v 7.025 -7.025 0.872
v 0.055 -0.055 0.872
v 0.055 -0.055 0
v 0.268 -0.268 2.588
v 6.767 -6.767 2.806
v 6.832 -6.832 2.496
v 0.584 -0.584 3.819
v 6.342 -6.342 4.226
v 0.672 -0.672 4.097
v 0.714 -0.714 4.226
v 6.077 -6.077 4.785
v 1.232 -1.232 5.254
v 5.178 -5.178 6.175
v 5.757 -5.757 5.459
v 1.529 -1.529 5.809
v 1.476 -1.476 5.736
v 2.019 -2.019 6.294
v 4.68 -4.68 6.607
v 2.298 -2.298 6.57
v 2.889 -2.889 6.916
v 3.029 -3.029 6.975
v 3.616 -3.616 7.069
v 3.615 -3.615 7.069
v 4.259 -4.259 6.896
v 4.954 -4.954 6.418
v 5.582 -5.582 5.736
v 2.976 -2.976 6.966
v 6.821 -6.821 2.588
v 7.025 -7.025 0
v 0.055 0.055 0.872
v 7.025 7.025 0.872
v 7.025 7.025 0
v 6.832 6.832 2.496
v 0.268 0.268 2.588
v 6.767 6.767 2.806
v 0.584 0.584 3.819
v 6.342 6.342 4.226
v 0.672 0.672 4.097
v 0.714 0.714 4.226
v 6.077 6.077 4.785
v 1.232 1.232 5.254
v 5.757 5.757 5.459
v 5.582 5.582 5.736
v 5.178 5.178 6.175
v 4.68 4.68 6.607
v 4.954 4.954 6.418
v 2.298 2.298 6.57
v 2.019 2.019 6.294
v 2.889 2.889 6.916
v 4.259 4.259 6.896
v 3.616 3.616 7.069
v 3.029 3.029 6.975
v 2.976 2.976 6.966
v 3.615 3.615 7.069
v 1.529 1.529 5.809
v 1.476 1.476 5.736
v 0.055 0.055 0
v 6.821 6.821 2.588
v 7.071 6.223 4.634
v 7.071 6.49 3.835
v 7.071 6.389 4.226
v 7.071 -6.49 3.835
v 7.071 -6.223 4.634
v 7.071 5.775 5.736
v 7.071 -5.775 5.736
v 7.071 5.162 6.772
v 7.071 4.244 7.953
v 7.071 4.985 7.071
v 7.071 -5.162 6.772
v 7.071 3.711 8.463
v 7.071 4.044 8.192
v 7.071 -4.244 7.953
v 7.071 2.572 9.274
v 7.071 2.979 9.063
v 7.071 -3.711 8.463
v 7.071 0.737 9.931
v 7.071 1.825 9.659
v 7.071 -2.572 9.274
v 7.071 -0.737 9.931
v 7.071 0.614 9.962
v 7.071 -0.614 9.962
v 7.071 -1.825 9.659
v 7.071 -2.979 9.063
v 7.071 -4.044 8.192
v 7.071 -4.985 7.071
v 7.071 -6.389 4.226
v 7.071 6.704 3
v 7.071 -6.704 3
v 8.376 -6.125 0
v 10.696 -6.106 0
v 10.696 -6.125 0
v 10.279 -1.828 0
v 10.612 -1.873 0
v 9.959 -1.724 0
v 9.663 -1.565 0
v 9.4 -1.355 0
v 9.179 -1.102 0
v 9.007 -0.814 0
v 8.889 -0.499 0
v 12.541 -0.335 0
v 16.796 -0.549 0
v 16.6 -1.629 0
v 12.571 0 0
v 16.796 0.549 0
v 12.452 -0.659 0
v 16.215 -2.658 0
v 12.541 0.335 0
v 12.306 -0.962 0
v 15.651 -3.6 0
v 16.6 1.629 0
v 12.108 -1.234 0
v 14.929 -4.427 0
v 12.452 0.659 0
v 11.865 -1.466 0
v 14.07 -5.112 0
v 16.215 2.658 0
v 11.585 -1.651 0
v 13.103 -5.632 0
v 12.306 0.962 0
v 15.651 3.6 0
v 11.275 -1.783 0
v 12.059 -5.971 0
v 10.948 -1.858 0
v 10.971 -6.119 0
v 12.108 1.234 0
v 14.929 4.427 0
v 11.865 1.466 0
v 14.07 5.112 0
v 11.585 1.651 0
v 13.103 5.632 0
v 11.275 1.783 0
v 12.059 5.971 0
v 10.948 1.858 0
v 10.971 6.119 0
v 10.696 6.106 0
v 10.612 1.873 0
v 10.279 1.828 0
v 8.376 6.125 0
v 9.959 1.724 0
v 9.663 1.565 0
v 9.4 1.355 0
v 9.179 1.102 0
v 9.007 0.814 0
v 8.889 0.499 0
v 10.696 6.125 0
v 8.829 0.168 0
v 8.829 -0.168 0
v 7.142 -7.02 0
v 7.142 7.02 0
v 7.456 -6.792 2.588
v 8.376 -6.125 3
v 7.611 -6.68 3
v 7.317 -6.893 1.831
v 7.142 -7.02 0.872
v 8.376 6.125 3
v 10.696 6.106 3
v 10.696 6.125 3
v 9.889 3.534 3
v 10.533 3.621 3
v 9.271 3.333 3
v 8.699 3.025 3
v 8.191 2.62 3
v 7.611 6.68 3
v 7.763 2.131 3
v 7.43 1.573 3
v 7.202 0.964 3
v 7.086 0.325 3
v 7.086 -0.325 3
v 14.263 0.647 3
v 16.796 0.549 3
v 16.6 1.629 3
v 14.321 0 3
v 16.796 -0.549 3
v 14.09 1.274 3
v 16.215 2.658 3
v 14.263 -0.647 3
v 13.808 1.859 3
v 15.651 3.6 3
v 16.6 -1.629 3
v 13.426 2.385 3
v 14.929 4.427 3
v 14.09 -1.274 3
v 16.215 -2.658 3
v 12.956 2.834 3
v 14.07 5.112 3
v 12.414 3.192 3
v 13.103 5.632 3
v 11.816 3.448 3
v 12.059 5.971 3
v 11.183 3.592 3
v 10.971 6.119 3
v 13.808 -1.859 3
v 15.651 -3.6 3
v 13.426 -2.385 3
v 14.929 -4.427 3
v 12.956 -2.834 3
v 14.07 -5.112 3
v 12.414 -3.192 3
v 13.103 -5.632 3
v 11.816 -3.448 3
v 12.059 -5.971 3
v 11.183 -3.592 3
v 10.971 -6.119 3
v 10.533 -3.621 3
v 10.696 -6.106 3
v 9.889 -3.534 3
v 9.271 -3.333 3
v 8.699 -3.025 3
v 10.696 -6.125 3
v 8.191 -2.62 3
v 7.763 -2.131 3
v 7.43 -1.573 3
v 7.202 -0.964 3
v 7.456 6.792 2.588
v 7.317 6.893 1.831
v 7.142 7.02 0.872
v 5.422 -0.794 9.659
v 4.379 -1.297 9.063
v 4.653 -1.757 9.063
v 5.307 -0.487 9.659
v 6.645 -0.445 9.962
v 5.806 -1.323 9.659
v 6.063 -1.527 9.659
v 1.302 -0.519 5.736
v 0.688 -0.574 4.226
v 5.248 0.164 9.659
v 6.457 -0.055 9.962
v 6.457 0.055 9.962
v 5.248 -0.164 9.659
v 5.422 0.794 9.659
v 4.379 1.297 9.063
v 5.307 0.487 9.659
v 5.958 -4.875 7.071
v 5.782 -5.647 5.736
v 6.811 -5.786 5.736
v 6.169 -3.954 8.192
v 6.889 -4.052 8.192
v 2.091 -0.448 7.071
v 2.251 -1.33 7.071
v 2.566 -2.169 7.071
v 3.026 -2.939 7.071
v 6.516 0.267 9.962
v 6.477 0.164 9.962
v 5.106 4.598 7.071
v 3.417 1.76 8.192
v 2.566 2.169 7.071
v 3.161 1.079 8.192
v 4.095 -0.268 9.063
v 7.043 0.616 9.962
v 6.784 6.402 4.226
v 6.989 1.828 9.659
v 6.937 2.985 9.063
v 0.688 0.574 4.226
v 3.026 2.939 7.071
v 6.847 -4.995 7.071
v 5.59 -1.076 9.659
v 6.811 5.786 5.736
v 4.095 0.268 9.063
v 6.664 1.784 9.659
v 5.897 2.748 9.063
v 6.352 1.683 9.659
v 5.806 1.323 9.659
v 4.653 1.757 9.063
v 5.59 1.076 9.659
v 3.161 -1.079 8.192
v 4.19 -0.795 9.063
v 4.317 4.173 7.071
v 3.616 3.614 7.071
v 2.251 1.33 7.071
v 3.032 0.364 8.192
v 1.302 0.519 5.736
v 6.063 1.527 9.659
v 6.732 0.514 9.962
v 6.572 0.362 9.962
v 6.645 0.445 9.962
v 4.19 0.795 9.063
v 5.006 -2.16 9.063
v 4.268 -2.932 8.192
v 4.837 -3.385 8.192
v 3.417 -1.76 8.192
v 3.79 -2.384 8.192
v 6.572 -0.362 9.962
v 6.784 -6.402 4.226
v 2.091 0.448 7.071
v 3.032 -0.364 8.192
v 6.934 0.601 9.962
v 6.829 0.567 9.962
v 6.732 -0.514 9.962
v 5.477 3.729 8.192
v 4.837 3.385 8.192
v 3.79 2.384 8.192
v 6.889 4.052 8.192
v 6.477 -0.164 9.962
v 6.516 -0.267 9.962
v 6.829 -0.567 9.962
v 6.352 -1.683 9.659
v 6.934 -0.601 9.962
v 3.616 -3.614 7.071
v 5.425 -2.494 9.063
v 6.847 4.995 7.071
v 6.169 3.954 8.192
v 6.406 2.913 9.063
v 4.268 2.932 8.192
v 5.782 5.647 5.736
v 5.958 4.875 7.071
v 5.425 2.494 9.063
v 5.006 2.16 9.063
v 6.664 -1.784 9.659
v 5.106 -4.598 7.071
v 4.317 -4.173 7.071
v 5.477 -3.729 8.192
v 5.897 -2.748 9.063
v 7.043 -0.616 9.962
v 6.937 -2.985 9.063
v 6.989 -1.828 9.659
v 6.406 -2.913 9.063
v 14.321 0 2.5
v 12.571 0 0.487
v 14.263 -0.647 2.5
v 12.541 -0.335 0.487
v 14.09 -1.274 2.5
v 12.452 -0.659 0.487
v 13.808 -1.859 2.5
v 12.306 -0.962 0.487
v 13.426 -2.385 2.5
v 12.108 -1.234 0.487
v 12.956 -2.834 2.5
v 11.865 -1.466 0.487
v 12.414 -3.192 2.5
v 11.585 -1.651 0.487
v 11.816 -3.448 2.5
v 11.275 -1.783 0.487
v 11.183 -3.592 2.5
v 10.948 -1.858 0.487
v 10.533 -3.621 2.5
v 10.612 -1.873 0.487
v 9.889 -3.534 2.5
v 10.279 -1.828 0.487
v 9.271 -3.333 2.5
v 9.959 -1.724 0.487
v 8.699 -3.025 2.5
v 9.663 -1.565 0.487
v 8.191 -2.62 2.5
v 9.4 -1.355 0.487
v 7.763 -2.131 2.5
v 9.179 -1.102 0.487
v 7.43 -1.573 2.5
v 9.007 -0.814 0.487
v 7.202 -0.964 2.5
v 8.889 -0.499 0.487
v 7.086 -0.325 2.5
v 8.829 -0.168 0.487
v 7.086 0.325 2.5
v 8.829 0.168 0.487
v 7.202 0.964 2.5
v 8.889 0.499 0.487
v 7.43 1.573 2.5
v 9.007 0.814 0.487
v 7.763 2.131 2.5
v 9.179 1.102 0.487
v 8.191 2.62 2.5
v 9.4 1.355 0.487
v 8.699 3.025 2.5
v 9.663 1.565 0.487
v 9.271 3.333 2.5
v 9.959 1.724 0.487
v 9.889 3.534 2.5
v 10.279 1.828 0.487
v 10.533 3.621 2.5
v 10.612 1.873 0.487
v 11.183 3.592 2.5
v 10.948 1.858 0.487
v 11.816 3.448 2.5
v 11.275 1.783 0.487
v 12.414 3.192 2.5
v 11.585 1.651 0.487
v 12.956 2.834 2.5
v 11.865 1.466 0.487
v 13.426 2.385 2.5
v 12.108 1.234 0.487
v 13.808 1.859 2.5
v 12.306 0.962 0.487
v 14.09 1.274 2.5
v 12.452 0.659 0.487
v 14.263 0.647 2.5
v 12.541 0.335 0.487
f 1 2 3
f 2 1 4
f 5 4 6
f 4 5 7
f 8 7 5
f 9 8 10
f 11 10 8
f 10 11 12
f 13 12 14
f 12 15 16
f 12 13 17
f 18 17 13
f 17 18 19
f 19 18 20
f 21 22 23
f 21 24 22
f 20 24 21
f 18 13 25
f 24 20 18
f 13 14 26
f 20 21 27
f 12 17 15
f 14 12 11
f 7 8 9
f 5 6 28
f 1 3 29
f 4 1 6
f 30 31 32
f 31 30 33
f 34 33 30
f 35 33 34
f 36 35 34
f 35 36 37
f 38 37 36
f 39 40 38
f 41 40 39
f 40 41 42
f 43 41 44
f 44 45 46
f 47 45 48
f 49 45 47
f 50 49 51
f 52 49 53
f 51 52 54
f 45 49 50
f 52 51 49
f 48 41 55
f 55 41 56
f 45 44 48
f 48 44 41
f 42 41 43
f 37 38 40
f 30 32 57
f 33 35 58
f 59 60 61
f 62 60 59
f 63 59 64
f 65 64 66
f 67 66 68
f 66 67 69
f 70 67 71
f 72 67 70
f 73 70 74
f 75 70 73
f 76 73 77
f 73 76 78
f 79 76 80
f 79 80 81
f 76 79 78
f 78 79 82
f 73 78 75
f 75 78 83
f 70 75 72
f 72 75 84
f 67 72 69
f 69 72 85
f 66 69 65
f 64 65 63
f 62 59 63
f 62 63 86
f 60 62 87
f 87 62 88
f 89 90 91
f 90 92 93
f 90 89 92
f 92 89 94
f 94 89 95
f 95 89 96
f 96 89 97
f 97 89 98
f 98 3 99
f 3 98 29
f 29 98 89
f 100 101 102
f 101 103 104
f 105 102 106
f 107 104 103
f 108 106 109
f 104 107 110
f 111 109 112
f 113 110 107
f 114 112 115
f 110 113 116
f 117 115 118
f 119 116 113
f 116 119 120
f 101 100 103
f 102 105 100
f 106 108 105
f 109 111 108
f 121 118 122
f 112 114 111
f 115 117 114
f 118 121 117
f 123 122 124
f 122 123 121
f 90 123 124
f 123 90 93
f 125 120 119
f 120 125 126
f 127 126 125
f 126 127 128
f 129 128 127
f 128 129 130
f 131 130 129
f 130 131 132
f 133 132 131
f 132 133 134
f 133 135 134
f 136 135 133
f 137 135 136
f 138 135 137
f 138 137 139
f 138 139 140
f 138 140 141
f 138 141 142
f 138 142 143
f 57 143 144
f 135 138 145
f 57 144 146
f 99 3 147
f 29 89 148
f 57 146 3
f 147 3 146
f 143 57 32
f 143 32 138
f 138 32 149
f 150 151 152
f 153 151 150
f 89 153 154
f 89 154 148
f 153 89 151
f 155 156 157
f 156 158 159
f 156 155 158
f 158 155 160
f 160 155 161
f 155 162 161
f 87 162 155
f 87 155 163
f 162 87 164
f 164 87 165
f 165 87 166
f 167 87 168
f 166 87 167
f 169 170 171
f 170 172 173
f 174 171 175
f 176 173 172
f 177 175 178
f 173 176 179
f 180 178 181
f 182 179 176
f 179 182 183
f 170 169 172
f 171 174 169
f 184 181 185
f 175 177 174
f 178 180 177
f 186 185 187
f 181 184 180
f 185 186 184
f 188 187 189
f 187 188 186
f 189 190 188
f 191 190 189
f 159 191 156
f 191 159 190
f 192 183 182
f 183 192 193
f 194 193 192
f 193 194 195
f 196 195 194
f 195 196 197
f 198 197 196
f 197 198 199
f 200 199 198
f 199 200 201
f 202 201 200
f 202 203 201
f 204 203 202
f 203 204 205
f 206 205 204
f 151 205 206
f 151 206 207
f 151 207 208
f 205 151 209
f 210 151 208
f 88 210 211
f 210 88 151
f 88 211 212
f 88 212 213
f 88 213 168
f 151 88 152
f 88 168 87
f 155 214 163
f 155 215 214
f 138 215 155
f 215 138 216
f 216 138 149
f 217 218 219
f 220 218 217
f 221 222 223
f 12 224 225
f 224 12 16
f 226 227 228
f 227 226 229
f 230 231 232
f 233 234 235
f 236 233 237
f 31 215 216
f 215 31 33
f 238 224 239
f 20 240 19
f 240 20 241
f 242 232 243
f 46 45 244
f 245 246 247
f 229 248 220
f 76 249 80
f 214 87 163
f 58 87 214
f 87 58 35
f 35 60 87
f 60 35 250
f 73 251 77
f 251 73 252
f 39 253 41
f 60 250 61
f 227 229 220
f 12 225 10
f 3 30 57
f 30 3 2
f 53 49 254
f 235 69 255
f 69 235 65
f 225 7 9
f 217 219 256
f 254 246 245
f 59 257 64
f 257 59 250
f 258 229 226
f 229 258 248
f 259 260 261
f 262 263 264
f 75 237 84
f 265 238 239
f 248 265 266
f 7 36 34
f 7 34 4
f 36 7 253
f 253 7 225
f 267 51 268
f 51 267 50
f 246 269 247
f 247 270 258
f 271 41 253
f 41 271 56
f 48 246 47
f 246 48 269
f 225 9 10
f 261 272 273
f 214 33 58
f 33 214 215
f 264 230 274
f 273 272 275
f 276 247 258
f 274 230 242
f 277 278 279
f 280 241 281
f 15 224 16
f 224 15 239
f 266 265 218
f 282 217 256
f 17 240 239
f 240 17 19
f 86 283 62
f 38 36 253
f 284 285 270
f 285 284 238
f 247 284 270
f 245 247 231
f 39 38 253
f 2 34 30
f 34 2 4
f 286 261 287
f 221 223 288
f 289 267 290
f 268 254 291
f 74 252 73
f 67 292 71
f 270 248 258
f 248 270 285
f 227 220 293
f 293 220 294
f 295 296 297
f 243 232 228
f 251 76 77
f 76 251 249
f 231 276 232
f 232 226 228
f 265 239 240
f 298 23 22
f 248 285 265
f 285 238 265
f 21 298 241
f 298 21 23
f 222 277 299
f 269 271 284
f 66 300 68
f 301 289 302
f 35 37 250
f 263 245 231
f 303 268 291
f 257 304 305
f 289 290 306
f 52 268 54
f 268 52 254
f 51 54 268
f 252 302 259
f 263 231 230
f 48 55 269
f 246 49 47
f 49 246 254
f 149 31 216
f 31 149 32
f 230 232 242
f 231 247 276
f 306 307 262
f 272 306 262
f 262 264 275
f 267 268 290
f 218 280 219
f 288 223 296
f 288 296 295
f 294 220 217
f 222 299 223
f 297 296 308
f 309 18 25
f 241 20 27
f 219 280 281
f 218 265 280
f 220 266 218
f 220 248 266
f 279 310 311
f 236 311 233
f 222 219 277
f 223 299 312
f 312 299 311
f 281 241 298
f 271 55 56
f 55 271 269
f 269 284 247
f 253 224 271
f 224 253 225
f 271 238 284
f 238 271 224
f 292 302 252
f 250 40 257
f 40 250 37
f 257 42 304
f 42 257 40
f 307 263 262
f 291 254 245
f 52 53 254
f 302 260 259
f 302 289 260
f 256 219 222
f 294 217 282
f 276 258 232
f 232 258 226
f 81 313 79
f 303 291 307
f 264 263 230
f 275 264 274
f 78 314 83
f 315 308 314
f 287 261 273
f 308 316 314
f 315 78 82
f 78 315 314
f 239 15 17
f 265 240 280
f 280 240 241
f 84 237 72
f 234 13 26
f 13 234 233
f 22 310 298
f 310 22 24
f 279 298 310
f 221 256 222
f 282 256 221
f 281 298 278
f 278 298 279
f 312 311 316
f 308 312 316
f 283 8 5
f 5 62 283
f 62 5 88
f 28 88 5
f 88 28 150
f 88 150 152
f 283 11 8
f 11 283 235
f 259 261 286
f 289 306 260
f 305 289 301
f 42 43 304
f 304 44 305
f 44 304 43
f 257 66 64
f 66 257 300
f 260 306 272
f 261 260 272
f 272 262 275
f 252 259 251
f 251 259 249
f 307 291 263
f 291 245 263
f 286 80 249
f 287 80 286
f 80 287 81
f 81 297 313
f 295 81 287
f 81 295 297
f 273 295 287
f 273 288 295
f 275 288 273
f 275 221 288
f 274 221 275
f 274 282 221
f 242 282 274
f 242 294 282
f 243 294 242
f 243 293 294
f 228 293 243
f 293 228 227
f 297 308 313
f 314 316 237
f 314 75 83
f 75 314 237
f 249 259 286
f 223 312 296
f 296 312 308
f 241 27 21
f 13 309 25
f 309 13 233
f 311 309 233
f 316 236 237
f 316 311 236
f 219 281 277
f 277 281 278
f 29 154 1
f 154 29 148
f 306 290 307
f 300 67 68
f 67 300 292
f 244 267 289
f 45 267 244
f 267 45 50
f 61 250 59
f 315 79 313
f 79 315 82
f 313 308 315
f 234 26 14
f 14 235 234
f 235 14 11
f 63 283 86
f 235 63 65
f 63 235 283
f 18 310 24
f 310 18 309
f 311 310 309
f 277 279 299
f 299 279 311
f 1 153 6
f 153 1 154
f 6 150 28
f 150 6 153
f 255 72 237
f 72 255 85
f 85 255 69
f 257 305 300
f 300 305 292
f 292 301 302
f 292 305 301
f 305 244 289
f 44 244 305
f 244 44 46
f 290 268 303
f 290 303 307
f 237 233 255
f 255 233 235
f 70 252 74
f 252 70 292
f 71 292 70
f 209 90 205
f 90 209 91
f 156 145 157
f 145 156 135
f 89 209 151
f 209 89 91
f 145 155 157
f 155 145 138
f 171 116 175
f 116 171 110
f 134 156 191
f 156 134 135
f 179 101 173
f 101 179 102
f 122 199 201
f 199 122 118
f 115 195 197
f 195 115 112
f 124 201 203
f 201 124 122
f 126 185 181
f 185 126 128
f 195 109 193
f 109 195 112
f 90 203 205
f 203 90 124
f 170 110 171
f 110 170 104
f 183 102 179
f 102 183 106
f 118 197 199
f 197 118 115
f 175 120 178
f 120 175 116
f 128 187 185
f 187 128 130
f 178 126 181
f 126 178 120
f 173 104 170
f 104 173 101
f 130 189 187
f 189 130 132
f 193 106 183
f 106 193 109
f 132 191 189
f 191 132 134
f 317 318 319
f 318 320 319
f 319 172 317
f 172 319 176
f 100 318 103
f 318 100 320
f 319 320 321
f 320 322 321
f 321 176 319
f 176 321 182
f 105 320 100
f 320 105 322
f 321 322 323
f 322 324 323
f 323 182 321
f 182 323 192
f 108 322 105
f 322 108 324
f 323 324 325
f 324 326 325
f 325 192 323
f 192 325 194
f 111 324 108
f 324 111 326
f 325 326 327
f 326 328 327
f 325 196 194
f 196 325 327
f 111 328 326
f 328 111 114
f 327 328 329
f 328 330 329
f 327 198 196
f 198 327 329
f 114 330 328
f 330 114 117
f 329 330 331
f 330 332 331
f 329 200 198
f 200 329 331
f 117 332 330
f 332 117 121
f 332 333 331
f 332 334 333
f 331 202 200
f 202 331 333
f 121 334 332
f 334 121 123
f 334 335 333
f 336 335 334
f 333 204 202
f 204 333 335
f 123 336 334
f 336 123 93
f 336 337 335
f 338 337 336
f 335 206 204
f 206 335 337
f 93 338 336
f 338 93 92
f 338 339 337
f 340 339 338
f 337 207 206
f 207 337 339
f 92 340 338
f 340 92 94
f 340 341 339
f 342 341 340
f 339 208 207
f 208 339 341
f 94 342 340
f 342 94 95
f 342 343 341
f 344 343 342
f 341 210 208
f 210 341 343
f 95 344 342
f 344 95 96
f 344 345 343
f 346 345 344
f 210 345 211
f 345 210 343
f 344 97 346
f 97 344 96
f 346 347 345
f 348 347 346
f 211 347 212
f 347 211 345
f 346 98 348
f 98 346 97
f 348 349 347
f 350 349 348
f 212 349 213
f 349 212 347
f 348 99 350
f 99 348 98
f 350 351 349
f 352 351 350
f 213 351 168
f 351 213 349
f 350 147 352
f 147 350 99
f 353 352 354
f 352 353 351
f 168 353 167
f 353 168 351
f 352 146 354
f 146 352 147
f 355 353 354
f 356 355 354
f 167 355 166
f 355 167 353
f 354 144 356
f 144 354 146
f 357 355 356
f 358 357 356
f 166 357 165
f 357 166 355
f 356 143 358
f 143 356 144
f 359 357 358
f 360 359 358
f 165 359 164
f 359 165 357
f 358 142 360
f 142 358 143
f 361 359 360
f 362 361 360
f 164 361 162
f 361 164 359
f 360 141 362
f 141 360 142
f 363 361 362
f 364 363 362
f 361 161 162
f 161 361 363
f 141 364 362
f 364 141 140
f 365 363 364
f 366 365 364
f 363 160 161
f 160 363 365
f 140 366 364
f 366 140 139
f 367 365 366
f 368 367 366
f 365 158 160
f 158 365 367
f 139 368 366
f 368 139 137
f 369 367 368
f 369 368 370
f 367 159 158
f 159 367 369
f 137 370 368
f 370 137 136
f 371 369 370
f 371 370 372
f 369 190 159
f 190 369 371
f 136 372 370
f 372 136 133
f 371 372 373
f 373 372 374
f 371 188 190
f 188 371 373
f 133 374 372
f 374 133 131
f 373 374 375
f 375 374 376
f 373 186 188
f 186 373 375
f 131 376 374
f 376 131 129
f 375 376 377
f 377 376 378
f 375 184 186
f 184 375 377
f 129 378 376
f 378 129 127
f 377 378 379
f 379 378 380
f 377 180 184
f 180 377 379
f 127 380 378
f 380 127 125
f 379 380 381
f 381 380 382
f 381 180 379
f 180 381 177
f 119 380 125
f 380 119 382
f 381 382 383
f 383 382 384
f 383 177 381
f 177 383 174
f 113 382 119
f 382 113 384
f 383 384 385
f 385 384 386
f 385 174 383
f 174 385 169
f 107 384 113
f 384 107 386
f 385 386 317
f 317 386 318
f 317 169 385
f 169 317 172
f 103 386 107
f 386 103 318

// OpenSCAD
/*
 * Lid Postion Guide (Parametric), v0.42
 *
 * by Alex Franke (CodeCreations), Dec 2012
 * http://www.theFrankes.com
 * 
 * Licenced under Creative Commons Attribution - Non-Commercial - Share Alike 3.0 
 * 
 * DESCRIPTION: Serves as a guide for placing a rectangular lid onto a flat surface in 
 *   a specific position. 
 * 
 * INSTRUCTIONS:  Print 3-4 guides and install then with the lid in place, if possible. 
 * 
 * v0.42, Dec 28, 2012: Initial Release.
 * 
 * TODO: 
 *   * None at this time.
 */


/////////////////////////////////////////////////////////////////////////////
// User-defined values... 
/////////////////////////////////////////////////////////////////////////////

cornerAngle    = 90;   // Angle of corner the guild will be placed against
sideLength     = 10;   // The length of each side of the guide, extending from the corner
guideHeight    = 10;   // The height of the guide portion of the piece
bodyHeight     = 3;    // The height of the body portion that gets fastened down

shaftDiameter  = 3.75; // The diameter of the through-hole for the screw. #6=3.58
headDiameter   = 7.25; // The diameter of the head of the screw. #6=7.14
holePadding    = 2.5;  // The width of the material around the hole 
screwAngle     = 82;   // Countersink angle (angle of screw head -- 82 is pretty standard for wood 
                       //   screws.) Other common countersink angles are 60, 90, 100, 110, and 120. 

counterSink    = 0.5;  // Additional distance to inset the countersink

$fn            = 35;   // General curve quality


/////////////////////////////////////////////////////////////////////////////
// The code...
/////////////////////////////////////////////////////////////////////////////

wedgeLength = sideLength*cos(cornerAngle/2);
wedgeHeight = sideLength*sin(cornerAngle/2);
yHeight = (headDiameter/2-shaftDiameter/2)/tan(screwAngle/2); 

difference() {
	union() {
		intersection() {
	
			union() {
				wedge(wedgeLength, guideHeight, cornerAngle);
					linear_extrude(height=bodyHeight, convexity=4) {
						polygon(points=[
							[wedgeLength,wedgeHeight],
							[wedgeLength+headDiameter+holePadding,0],
							[wedgeLength,-wedgeHeight]
						]);
					}
			}
			translate([wedgeLength,0,0]) 
				scale([wedgeLength,wedgeLength,guideHeight]) 
					sphere(r=1) ;
		}
	
		rotate(180) 
			translate([-(wedgeLength+headDiameter/2),0,0]) 
				bracket(headDiameter/2,shaftDiameter/2,headDiameter/2,holePadding,bodyHeight);
	}
	
	rotate(180) 
		translate([-(wedgeLength+headDiameter/2),0,-counterSink]) 
			bracketHole(shaftDiameter/2,headDiameter/2,screwAngle,bodyHeight);
}


/////////////////////////////////////////////////////////////////////////////
// Modules...
/////////////////////////////////////////////////////////////////////////////

// length = end to hole center
module bracket(length, holeRadius, headRadius, holePadding, thickness) {
	union() {
		translate([length/2,0,thickness/2]) 	
			cube([length,(headRadius+holePadding)*2,thickness], center=true); 
		cylinder(h=thickness,r=headRadius+holePadding);
	}
}

module bracketHole(holeRadius, headRadius, headAngle, thickness) {
	translate([0,0,thickness]) 
	rotate_extrude(convexity=4) {
		polygon(points=[
			[0,-(thickness+1)-yHeight],
			[holeRadius,-(thickness+1)-yHeight],
			[holeRadius,-yHeight],
			[headRadius,0],
			[headRadius,thickness+1],
			[0,thickness+1]
		]);
	}
}

module wedge(length, height, angle) {

	x = length; 
	y = 2*x*tan(angle/2); 
	z = height;
	x2 = (y/2)/sin(angle/2);

	difference() {
		translate([0,-y/2,0]) 
			cube([x,y,z]);

		for(i=[-1,1])
			rotate([0,0,angle/2*i]) 
				translate([0,-y/2 +y/2*i,-0.5]) 
					cube([x2,y,z+1]);

	}
}
